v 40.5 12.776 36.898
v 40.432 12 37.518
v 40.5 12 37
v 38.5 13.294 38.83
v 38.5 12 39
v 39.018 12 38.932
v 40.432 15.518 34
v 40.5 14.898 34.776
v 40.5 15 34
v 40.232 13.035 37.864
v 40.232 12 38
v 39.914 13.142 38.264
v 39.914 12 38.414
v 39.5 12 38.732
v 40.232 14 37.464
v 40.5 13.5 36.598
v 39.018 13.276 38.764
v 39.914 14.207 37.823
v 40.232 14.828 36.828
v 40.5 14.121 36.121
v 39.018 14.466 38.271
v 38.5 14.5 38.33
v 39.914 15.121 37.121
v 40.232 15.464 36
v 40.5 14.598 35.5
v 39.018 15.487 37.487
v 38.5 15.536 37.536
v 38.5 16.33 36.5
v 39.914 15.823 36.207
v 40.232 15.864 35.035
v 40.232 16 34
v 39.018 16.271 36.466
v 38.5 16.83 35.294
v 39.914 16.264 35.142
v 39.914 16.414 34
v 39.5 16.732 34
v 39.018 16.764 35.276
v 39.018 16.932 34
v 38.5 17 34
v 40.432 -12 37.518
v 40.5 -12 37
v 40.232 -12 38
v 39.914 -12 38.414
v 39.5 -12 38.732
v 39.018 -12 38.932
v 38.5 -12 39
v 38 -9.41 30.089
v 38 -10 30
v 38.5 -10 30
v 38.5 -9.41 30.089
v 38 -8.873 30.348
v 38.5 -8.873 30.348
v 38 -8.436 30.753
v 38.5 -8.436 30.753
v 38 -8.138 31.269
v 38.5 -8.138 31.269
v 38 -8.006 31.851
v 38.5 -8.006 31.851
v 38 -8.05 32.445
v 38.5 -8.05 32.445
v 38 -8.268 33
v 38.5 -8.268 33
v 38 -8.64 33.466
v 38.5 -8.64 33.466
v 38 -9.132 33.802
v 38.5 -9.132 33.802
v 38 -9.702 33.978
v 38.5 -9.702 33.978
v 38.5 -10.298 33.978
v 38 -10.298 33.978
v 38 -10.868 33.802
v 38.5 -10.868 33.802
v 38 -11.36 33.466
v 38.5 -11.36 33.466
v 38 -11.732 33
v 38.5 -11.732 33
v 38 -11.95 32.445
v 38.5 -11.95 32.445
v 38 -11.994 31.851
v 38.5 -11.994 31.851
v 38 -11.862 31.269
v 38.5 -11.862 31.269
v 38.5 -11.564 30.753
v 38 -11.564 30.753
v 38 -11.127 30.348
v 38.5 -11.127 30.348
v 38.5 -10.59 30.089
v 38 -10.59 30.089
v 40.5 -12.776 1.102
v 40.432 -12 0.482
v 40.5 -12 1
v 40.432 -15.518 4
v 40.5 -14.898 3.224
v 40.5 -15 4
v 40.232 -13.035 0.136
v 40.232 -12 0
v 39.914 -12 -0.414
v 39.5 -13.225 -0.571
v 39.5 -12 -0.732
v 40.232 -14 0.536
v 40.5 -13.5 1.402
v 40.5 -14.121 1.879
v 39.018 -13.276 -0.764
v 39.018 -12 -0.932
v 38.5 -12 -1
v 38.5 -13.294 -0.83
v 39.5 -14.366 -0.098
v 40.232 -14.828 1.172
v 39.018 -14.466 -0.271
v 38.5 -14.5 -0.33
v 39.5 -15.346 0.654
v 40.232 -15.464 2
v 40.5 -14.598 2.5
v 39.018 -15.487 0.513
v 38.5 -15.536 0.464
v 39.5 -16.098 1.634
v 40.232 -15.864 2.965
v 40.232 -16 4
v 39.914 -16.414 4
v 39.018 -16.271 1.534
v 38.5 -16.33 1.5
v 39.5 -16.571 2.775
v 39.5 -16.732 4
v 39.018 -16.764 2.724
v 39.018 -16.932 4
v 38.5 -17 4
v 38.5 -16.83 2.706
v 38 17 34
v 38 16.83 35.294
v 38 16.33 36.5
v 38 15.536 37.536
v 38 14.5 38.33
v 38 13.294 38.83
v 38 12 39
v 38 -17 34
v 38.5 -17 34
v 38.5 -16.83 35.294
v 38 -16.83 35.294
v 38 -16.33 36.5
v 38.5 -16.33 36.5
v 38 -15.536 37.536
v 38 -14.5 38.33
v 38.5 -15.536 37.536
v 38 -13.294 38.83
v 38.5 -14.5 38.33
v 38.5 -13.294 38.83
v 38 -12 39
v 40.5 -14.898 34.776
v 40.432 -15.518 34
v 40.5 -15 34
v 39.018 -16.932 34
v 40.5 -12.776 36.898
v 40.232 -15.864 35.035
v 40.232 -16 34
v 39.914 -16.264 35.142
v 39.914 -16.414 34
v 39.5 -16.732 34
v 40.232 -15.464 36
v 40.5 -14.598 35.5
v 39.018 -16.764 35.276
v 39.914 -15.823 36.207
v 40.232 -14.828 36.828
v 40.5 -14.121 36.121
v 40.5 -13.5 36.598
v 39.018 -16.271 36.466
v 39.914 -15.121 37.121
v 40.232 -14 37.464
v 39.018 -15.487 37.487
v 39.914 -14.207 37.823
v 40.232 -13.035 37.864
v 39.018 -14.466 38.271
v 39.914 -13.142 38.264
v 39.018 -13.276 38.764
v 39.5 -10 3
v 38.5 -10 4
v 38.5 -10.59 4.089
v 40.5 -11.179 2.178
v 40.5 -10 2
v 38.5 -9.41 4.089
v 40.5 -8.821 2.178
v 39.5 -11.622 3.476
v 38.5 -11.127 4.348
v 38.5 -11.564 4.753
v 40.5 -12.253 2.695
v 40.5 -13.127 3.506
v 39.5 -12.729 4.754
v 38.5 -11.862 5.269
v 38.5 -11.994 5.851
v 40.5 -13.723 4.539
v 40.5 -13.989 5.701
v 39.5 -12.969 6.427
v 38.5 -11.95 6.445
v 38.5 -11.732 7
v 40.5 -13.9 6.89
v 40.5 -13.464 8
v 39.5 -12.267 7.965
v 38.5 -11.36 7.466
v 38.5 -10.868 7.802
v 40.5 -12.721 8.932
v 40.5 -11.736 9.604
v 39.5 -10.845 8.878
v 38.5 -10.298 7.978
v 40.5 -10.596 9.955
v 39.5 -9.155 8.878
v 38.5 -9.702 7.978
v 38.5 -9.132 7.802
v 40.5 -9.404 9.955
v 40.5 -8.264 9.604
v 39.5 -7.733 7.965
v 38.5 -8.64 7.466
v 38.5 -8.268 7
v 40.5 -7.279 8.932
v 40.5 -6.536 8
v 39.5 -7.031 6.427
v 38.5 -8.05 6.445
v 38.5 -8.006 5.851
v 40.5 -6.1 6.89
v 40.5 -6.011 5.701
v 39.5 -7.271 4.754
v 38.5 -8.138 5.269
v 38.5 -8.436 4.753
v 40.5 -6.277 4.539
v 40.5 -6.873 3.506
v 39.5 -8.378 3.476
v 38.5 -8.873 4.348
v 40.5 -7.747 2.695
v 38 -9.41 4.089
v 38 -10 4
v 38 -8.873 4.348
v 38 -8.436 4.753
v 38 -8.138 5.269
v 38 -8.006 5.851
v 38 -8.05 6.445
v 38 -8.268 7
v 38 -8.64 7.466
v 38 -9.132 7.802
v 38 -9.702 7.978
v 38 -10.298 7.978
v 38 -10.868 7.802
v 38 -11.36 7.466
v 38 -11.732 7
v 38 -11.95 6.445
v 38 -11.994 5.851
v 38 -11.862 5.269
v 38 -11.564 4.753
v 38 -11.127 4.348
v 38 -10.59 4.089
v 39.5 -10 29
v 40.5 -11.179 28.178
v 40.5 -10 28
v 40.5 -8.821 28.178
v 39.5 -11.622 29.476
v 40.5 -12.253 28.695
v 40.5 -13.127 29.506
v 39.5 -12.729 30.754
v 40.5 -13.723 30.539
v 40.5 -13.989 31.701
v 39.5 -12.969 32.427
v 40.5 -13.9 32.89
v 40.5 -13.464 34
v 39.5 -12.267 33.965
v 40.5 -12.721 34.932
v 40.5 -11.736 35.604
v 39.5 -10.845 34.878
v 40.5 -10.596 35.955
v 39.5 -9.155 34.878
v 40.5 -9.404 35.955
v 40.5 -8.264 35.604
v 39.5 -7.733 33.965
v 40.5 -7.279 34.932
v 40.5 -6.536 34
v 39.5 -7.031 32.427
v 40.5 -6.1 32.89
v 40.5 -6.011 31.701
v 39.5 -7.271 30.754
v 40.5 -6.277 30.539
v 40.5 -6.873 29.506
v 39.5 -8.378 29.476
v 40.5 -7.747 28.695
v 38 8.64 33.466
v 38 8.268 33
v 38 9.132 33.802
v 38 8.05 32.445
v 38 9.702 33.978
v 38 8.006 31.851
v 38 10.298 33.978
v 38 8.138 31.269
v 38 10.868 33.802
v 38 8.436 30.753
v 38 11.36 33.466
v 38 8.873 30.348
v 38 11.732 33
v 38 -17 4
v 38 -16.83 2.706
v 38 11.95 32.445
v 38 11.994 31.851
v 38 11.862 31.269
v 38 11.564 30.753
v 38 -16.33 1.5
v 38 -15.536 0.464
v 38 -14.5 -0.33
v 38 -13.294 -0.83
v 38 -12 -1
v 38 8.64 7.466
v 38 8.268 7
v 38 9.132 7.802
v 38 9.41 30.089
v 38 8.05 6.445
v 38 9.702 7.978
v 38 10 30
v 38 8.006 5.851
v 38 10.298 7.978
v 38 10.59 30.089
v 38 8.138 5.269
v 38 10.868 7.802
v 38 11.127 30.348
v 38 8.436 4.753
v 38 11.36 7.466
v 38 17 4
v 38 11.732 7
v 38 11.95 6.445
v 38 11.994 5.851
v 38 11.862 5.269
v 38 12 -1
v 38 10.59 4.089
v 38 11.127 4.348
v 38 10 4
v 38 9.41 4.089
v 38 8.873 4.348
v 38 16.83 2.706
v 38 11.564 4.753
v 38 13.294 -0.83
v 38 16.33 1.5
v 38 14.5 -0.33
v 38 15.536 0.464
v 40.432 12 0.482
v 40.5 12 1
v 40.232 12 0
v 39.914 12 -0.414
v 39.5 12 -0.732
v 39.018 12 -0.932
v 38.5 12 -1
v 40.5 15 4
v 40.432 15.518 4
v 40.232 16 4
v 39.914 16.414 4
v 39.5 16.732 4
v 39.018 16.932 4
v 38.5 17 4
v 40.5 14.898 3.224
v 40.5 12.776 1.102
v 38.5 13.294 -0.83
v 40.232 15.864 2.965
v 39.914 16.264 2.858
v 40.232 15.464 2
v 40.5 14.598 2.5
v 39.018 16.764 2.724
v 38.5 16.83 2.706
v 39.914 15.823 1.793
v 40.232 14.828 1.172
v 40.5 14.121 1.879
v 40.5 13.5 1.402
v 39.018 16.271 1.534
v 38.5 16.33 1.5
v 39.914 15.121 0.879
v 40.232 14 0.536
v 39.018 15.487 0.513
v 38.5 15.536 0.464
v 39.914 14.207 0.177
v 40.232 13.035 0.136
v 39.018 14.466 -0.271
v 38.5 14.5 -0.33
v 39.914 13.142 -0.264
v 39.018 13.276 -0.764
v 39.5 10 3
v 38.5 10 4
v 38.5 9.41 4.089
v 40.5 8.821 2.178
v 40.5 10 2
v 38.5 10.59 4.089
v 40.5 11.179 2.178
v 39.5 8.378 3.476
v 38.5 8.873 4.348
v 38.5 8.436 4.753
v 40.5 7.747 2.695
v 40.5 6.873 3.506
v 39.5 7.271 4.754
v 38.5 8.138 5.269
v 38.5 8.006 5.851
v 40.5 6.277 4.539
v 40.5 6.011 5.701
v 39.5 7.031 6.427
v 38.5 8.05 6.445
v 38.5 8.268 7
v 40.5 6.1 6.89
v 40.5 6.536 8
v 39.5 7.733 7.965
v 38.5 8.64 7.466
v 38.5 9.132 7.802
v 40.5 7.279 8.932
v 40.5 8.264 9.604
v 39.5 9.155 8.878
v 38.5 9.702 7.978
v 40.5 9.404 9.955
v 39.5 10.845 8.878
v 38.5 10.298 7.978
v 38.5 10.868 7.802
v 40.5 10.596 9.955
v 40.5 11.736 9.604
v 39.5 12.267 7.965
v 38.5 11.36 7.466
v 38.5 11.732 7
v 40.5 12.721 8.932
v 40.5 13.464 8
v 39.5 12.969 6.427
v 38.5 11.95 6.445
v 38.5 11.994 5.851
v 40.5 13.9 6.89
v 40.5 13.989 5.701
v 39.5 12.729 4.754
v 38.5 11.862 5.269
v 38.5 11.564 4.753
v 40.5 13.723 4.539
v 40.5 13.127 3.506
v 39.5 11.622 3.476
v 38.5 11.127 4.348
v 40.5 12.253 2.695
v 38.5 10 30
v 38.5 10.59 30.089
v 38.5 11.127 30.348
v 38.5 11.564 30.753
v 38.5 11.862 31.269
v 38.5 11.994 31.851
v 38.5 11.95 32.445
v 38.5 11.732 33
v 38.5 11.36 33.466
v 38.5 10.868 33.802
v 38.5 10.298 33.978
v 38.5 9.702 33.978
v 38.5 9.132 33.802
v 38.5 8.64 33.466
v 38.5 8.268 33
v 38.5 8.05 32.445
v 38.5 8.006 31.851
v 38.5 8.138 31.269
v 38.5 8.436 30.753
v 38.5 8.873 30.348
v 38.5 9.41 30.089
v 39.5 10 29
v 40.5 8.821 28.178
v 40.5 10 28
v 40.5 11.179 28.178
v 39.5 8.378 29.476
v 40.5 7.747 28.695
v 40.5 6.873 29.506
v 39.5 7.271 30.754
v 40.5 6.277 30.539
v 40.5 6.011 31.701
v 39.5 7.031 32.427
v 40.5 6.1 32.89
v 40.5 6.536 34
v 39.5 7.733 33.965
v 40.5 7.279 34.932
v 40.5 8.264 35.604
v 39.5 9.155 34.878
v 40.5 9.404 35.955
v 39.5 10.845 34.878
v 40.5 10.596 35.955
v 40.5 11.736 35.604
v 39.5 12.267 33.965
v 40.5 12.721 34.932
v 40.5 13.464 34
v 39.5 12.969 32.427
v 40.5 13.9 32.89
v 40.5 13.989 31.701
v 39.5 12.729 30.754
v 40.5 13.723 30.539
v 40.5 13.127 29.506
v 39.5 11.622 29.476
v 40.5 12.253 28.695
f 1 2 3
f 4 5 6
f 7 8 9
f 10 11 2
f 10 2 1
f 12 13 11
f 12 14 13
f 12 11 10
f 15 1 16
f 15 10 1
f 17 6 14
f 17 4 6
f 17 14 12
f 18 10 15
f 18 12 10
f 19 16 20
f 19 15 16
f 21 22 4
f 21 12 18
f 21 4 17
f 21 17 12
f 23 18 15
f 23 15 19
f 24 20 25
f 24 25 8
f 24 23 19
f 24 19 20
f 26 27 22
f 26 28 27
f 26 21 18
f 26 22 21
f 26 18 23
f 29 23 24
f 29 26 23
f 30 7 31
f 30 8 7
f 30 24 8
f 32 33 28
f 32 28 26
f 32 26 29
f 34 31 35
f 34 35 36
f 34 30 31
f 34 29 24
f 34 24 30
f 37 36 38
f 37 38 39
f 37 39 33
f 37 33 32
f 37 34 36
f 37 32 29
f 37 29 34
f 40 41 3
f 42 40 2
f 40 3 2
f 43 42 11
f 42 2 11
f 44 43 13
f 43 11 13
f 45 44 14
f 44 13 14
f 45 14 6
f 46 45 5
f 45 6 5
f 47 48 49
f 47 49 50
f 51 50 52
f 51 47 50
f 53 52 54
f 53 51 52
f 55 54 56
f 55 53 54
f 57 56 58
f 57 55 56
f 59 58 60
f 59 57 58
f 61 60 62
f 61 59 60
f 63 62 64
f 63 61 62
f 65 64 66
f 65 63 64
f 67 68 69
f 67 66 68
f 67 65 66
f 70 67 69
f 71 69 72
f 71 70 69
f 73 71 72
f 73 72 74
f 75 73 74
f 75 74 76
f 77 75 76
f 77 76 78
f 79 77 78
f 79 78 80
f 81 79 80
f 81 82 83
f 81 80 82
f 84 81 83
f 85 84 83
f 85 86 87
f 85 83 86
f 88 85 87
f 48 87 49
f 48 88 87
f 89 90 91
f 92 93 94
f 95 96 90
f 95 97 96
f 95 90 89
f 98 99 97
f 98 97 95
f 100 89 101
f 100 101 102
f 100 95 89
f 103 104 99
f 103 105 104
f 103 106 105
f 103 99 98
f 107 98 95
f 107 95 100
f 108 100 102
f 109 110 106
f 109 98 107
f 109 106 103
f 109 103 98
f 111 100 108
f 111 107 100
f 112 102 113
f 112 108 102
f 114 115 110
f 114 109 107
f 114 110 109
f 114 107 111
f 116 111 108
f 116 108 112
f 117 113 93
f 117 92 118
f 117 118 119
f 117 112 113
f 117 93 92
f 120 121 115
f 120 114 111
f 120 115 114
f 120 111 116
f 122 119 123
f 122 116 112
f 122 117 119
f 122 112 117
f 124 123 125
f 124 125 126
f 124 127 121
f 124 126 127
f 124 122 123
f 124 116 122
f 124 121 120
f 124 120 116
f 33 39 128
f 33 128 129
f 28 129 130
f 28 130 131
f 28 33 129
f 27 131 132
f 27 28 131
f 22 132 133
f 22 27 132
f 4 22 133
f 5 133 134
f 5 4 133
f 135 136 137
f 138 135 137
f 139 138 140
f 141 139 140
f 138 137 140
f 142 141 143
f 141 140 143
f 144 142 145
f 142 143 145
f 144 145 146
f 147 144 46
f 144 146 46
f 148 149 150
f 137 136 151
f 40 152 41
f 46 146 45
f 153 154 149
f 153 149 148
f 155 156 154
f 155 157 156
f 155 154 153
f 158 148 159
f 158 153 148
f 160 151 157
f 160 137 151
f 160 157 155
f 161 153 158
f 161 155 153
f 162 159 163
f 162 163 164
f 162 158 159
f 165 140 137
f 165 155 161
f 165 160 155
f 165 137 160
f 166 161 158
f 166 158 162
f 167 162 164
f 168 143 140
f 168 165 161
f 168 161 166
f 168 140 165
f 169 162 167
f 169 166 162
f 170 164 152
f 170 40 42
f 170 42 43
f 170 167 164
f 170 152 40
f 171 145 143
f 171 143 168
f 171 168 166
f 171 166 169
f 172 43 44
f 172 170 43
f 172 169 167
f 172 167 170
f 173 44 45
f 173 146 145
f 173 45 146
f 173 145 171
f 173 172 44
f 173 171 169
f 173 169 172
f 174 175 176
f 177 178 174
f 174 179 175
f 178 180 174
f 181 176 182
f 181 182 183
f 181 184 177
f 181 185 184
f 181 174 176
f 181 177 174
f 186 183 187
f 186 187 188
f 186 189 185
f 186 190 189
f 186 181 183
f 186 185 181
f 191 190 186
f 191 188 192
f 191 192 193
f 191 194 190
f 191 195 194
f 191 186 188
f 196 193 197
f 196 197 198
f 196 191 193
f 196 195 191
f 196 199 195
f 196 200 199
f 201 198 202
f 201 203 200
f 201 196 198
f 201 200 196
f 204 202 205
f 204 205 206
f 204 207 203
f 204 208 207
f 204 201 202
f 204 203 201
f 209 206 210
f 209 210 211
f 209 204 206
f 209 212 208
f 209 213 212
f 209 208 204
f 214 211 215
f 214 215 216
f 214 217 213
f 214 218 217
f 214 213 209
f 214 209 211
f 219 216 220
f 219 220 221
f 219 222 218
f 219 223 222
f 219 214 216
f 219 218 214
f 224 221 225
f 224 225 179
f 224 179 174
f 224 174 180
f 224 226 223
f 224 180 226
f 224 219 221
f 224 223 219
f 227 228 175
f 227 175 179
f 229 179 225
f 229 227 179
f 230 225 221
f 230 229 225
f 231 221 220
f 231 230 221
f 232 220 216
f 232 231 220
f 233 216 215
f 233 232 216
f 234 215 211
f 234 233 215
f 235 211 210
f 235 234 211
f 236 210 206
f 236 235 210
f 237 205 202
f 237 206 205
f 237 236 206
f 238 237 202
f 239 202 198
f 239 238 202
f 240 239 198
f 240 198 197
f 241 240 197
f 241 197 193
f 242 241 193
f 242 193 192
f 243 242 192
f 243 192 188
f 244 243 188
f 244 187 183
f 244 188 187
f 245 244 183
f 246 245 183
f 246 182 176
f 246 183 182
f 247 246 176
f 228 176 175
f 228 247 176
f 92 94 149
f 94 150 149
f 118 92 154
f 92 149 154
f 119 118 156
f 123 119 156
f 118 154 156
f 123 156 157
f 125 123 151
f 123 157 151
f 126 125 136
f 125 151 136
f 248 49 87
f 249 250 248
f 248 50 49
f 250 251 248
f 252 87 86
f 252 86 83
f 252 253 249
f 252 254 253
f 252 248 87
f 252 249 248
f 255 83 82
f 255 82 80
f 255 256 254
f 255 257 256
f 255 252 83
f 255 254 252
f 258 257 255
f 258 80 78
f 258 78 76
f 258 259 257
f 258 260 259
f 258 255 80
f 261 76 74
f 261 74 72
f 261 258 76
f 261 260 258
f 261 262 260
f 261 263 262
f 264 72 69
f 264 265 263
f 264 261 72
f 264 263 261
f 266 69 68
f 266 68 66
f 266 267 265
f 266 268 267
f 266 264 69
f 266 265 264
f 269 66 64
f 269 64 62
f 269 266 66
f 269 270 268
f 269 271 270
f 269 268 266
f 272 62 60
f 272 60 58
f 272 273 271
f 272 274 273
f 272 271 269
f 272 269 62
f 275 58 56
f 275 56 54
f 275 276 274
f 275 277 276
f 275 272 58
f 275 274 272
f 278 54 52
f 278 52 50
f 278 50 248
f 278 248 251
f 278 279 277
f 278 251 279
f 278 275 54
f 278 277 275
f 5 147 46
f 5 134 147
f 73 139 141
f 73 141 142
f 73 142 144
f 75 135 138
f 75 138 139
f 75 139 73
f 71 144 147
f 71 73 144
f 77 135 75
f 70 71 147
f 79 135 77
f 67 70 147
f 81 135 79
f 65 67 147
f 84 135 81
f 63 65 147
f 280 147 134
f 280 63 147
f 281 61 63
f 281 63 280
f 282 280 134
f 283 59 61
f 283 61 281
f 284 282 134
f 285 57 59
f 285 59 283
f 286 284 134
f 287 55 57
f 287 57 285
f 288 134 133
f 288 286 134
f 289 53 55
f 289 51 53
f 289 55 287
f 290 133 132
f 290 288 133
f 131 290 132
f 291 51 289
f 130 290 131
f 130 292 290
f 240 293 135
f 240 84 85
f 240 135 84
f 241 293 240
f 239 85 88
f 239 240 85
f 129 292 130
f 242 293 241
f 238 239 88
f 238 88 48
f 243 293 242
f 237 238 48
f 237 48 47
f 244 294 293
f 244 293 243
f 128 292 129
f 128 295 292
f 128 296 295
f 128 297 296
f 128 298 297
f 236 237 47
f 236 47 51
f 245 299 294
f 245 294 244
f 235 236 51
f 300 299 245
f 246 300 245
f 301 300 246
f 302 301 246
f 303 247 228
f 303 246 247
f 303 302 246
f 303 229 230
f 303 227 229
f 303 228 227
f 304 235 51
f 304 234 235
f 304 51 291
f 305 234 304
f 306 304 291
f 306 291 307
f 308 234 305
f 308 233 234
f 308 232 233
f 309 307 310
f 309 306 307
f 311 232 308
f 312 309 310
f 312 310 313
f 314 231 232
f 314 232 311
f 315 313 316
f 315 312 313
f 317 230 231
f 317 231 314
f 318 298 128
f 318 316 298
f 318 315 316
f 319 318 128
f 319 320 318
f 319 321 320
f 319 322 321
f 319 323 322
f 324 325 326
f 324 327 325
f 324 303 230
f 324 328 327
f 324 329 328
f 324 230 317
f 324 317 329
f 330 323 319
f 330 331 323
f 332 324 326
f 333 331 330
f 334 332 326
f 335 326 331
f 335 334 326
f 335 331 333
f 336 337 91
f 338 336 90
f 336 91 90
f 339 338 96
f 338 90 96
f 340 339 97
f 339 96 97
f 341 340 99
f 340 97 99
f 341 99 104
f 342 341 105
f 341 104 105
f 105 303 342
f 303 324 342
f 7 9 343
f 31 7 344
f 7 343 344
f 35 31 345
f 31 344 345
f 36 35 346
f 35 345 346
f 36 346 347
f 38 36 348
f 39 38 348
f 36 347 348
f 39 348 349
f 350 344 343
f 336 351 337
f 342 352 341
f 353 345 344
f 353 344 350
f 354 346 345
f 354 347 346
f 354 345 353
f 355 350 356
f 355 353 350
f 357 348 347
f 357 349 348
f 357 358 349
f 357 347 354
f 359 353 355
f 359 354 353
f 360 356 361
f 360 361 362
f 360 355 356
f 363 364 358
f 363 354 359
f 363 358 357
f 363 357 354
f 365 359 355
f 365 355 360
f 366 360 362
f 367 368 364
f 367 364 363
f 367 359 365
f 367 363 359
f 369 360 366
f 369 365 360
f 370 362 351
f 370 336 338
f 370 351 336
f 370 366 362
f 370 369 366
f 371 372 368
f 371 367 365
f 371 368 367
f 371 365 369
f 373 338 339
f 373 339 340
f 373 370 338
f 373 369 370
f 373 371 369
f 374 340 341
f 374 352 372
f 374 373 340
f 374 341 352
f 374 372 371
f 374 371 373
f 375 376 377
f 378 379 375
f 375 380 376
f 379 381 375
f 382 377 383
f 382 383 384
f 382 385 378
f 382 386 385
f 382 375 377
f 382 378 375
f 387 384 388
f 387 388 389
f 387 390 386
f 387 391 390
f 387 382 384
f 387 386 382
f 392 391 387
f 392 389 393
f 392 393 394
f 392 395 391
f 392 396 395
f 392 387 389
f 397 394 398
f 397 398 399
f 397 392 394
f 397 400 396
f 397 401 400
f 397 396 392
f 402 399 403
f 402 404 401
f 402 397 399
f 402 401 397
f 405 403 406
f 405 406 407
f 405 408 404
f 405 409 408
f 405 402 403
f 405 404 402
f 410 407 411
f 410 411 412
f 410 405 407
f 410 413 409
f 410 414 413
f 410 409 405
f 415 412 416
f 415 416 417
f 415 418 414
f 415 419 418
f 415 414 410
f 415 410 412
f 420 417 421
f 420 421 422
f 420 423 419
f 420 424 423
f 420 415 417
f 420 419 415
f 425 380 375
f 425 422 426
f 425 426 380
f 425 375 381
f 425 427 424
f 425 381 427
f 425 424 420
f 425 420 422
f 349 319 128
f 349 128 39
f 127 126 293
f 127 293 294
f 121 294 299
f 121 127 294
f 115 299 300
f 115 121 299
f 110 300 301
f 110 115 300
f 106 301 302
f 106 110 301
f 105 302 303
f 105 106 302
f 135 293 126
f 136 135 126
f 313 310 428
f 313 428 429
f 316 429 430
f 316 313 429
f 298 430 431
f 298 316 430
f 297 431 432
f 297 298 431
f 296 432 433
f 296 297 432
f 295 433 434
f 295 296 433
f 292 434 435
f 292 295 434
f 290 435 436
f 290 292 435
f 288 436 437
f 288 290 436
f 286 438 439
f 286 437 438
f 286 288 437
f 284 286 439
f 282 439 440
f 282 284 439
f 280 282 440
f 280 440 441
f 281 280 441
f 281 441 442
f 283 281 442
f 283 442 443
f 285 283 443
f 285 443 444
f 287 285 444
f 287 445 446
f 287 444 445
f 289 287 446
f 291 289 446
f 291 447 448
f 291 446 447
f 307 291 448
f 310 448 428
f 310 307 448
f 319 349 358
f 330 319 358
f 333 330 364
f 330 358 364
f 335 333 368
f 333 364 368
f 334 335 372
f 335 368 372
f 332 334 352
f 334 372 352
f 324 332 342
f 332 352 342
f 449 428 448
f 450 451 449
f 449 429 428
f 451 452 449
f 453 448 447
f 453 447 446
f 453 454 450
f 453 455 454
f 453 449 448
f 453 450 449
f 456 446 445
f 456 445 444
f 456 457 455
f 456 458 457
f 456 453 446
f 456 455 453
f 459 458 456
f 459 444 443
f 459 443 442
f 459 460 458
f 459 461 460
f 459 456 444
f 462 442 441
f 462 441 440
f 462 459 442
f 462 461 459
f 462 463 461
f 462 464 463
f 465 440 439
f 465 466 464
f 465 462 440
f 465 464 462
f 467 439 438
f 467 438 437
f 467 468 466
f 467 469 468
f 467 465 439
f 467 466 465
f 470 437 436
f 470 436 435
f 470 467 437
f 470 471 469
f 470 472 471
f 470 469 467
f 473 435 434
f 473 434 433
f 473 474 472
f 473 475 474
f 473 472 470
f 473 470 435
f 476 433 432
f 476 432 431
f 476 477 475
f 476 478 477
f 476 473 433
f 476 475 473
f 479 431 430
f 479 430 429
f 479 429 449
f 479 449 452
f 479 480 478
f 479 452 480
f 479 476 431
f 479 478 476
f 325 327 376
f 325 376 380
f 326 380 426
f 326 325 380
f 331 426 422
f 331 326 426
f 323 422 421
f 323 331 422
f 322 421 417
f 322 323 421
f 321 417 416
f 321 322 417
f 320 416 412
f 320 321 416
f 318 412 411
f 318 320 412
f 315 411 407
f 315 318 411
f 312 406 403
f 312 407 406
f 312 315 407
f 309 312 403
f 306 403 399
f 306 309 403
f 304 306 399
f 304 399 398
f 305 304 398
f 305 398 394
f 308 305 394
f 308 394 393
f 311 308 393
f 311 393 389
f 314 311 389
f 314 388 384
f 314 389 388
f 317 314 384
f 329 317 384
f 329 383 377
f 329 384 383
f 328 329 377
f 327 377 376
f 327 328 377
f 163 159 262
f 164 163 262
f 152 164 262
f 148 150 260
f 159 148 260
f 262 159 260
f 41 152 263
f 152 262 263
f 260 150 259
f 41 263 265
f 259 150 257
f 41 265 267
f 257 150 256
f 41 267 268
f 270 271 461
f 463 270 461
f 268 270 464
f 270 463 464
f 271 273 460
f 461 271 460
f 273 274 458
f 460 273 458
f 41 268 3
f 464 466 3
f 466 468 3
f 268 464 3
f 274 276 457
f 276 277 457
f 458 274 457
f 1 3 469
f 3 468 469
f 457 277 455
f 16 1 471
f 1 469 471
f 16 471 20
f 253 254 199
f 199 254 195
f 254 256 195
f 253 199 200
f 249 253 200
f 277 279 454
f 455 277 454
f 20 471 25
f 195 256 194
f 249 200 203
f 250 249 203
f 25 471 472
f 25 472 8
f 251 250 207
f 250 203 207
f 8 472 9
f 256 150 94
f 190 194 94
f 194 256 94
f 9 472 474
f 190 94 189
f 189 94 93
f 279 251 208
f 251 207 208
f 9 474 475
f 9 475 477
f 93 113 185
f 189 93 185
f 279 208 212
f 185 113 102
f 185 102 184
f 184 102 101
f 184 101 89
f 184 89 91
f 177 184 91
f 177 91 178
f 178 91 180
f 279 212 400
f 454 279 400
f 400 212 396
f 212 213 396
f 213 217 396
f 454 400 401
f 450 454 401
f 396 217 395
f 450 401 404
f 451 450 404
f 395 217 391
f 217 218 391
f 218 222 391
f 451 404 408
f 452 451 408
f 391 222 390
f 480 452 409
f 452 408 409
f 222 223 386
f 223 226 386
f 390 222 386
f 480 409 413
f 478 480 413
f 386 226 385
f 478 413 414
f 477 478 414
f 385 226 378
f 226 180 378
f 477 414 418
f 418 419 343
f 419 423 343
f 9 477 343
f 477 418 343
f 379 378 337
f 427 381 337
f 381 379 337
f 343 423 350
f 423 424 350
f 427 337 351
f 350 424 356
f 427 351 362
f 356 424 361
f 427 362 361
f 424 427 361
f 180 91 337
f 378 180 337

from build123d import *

# Parameters (mm, degrees)
CYLINDER005_R     = 2
CYLINDER005_DEPTH = 30
CYLINDER006_R     = 2
CYLINDER006_DEPTH = 30
CYLINDER007_R     = 2
CYLINDER007_DEPTH = 30
CYLINDER004_R     = 2
CYLINDER004_DEPTH = 30
BOX001_W          = 2.5
BOX001_H          = 34
BOX001_DEPTH      = 40
FILLET006_R       = 5
CHAMFER006_SIZE   = 2
FILLET007_R       = 2


with BuildPart() as screwholle006:
    # Cylinder005 → Cylinder005 (new body)
    with BuildSketch(Plane(origin=(20, -10, 6), x_dir=(0, 0, -1), z_dir=(1, 0, 0))):
        Circle(CYLINDER005_R)
    extrude(amount=CYLINDER005_DEPTH)


with BuildPart() as screwholle007:
    # Cylinder006 → Cylinder006 (new body)
    with BuildSketch(Plane(origin=(20, -10, 32), x_dir=(0, 0, -1), z_dir=(1, 0, 0))):
        Circle(CYLINDER006_R)
    extrude(amount=CYLINDER006_DEPTH)


with BuildPart() as screwholle008:
    # Cylinder007 → Cylinder007 (new body)
    with BuildSketch(Plane(origin=(20, 10, 6), x_dir=(0, 0, -1), z_dir=(1, 0, 0))):
        Circle(CYLINDER007_R)
    extrude(amount=CYLINDER007_DEPTH)


with BuildPart() as capscrewholles:
    # Cylinder004 → Cylinder004 (new body)
    with BuildSketch(Plane(origin=(20, 10, 32), x_dir=(0, 0, -1), z_dir=(1, 0, 0))):
        Circle(CYLINDER004_R)
    extrude(amount=CYLINDER004_DEPTH)

    # Fusion003: union ScrewHolle006, ScrewHolle007, ScrewHolle008
    add(screwholle006.part)
    add(screwholle007.part)
    add(screwholle008.part)


with BuildPart() as hindgecap:
    # Box001 → Box001 (new body)
    with BuildSketch(Plane(origin=(38, -17, -1), x_dir=(1, 0, 0), z_dir=(0, 0, 1))):
        with Locations((1.25, 17)):
            Rectangle(BOX001_W, BOX001_H)
    extrude(amount=BOX001_DEPTH)

    # Fillet006
    fillet006_edges = [hindgecap.edges().sort_by_distance(p)[0] for p in [
        (39.25, -17, -1),
        (39.25, -17, 39),
        (39.25, 17, -1),
        (39.25, 17, 39),
    ]]
    fillet(fillet006_edges, radius=FILLET006_R)

    # Cut003: cut CapScrewHolles
    add(capscrewholles.part, mode=Mode.SUBTRACT)

    # Chamfer006
    chamfer006_edges = [hindgecap.edges().sort_by_distance(p)[0] for p in [
        (40.5, 10, 8),
        (40.5, 10, 34),
        (40.5, -10, 8),
        (40.5, -10, 34),
    ]]
    chamfer(chamfer006_edges, length=CHAMFER006_SIZE)

    # Fillet007
    fillet007_edges = [hindgecap.edges().sort_by_distance(p)[0] for p in [
        (40.5, -17, 19),
    ]]
    fillet(fillet007_edges, radius=FILLET007_R)


solid = hindgecap.part
